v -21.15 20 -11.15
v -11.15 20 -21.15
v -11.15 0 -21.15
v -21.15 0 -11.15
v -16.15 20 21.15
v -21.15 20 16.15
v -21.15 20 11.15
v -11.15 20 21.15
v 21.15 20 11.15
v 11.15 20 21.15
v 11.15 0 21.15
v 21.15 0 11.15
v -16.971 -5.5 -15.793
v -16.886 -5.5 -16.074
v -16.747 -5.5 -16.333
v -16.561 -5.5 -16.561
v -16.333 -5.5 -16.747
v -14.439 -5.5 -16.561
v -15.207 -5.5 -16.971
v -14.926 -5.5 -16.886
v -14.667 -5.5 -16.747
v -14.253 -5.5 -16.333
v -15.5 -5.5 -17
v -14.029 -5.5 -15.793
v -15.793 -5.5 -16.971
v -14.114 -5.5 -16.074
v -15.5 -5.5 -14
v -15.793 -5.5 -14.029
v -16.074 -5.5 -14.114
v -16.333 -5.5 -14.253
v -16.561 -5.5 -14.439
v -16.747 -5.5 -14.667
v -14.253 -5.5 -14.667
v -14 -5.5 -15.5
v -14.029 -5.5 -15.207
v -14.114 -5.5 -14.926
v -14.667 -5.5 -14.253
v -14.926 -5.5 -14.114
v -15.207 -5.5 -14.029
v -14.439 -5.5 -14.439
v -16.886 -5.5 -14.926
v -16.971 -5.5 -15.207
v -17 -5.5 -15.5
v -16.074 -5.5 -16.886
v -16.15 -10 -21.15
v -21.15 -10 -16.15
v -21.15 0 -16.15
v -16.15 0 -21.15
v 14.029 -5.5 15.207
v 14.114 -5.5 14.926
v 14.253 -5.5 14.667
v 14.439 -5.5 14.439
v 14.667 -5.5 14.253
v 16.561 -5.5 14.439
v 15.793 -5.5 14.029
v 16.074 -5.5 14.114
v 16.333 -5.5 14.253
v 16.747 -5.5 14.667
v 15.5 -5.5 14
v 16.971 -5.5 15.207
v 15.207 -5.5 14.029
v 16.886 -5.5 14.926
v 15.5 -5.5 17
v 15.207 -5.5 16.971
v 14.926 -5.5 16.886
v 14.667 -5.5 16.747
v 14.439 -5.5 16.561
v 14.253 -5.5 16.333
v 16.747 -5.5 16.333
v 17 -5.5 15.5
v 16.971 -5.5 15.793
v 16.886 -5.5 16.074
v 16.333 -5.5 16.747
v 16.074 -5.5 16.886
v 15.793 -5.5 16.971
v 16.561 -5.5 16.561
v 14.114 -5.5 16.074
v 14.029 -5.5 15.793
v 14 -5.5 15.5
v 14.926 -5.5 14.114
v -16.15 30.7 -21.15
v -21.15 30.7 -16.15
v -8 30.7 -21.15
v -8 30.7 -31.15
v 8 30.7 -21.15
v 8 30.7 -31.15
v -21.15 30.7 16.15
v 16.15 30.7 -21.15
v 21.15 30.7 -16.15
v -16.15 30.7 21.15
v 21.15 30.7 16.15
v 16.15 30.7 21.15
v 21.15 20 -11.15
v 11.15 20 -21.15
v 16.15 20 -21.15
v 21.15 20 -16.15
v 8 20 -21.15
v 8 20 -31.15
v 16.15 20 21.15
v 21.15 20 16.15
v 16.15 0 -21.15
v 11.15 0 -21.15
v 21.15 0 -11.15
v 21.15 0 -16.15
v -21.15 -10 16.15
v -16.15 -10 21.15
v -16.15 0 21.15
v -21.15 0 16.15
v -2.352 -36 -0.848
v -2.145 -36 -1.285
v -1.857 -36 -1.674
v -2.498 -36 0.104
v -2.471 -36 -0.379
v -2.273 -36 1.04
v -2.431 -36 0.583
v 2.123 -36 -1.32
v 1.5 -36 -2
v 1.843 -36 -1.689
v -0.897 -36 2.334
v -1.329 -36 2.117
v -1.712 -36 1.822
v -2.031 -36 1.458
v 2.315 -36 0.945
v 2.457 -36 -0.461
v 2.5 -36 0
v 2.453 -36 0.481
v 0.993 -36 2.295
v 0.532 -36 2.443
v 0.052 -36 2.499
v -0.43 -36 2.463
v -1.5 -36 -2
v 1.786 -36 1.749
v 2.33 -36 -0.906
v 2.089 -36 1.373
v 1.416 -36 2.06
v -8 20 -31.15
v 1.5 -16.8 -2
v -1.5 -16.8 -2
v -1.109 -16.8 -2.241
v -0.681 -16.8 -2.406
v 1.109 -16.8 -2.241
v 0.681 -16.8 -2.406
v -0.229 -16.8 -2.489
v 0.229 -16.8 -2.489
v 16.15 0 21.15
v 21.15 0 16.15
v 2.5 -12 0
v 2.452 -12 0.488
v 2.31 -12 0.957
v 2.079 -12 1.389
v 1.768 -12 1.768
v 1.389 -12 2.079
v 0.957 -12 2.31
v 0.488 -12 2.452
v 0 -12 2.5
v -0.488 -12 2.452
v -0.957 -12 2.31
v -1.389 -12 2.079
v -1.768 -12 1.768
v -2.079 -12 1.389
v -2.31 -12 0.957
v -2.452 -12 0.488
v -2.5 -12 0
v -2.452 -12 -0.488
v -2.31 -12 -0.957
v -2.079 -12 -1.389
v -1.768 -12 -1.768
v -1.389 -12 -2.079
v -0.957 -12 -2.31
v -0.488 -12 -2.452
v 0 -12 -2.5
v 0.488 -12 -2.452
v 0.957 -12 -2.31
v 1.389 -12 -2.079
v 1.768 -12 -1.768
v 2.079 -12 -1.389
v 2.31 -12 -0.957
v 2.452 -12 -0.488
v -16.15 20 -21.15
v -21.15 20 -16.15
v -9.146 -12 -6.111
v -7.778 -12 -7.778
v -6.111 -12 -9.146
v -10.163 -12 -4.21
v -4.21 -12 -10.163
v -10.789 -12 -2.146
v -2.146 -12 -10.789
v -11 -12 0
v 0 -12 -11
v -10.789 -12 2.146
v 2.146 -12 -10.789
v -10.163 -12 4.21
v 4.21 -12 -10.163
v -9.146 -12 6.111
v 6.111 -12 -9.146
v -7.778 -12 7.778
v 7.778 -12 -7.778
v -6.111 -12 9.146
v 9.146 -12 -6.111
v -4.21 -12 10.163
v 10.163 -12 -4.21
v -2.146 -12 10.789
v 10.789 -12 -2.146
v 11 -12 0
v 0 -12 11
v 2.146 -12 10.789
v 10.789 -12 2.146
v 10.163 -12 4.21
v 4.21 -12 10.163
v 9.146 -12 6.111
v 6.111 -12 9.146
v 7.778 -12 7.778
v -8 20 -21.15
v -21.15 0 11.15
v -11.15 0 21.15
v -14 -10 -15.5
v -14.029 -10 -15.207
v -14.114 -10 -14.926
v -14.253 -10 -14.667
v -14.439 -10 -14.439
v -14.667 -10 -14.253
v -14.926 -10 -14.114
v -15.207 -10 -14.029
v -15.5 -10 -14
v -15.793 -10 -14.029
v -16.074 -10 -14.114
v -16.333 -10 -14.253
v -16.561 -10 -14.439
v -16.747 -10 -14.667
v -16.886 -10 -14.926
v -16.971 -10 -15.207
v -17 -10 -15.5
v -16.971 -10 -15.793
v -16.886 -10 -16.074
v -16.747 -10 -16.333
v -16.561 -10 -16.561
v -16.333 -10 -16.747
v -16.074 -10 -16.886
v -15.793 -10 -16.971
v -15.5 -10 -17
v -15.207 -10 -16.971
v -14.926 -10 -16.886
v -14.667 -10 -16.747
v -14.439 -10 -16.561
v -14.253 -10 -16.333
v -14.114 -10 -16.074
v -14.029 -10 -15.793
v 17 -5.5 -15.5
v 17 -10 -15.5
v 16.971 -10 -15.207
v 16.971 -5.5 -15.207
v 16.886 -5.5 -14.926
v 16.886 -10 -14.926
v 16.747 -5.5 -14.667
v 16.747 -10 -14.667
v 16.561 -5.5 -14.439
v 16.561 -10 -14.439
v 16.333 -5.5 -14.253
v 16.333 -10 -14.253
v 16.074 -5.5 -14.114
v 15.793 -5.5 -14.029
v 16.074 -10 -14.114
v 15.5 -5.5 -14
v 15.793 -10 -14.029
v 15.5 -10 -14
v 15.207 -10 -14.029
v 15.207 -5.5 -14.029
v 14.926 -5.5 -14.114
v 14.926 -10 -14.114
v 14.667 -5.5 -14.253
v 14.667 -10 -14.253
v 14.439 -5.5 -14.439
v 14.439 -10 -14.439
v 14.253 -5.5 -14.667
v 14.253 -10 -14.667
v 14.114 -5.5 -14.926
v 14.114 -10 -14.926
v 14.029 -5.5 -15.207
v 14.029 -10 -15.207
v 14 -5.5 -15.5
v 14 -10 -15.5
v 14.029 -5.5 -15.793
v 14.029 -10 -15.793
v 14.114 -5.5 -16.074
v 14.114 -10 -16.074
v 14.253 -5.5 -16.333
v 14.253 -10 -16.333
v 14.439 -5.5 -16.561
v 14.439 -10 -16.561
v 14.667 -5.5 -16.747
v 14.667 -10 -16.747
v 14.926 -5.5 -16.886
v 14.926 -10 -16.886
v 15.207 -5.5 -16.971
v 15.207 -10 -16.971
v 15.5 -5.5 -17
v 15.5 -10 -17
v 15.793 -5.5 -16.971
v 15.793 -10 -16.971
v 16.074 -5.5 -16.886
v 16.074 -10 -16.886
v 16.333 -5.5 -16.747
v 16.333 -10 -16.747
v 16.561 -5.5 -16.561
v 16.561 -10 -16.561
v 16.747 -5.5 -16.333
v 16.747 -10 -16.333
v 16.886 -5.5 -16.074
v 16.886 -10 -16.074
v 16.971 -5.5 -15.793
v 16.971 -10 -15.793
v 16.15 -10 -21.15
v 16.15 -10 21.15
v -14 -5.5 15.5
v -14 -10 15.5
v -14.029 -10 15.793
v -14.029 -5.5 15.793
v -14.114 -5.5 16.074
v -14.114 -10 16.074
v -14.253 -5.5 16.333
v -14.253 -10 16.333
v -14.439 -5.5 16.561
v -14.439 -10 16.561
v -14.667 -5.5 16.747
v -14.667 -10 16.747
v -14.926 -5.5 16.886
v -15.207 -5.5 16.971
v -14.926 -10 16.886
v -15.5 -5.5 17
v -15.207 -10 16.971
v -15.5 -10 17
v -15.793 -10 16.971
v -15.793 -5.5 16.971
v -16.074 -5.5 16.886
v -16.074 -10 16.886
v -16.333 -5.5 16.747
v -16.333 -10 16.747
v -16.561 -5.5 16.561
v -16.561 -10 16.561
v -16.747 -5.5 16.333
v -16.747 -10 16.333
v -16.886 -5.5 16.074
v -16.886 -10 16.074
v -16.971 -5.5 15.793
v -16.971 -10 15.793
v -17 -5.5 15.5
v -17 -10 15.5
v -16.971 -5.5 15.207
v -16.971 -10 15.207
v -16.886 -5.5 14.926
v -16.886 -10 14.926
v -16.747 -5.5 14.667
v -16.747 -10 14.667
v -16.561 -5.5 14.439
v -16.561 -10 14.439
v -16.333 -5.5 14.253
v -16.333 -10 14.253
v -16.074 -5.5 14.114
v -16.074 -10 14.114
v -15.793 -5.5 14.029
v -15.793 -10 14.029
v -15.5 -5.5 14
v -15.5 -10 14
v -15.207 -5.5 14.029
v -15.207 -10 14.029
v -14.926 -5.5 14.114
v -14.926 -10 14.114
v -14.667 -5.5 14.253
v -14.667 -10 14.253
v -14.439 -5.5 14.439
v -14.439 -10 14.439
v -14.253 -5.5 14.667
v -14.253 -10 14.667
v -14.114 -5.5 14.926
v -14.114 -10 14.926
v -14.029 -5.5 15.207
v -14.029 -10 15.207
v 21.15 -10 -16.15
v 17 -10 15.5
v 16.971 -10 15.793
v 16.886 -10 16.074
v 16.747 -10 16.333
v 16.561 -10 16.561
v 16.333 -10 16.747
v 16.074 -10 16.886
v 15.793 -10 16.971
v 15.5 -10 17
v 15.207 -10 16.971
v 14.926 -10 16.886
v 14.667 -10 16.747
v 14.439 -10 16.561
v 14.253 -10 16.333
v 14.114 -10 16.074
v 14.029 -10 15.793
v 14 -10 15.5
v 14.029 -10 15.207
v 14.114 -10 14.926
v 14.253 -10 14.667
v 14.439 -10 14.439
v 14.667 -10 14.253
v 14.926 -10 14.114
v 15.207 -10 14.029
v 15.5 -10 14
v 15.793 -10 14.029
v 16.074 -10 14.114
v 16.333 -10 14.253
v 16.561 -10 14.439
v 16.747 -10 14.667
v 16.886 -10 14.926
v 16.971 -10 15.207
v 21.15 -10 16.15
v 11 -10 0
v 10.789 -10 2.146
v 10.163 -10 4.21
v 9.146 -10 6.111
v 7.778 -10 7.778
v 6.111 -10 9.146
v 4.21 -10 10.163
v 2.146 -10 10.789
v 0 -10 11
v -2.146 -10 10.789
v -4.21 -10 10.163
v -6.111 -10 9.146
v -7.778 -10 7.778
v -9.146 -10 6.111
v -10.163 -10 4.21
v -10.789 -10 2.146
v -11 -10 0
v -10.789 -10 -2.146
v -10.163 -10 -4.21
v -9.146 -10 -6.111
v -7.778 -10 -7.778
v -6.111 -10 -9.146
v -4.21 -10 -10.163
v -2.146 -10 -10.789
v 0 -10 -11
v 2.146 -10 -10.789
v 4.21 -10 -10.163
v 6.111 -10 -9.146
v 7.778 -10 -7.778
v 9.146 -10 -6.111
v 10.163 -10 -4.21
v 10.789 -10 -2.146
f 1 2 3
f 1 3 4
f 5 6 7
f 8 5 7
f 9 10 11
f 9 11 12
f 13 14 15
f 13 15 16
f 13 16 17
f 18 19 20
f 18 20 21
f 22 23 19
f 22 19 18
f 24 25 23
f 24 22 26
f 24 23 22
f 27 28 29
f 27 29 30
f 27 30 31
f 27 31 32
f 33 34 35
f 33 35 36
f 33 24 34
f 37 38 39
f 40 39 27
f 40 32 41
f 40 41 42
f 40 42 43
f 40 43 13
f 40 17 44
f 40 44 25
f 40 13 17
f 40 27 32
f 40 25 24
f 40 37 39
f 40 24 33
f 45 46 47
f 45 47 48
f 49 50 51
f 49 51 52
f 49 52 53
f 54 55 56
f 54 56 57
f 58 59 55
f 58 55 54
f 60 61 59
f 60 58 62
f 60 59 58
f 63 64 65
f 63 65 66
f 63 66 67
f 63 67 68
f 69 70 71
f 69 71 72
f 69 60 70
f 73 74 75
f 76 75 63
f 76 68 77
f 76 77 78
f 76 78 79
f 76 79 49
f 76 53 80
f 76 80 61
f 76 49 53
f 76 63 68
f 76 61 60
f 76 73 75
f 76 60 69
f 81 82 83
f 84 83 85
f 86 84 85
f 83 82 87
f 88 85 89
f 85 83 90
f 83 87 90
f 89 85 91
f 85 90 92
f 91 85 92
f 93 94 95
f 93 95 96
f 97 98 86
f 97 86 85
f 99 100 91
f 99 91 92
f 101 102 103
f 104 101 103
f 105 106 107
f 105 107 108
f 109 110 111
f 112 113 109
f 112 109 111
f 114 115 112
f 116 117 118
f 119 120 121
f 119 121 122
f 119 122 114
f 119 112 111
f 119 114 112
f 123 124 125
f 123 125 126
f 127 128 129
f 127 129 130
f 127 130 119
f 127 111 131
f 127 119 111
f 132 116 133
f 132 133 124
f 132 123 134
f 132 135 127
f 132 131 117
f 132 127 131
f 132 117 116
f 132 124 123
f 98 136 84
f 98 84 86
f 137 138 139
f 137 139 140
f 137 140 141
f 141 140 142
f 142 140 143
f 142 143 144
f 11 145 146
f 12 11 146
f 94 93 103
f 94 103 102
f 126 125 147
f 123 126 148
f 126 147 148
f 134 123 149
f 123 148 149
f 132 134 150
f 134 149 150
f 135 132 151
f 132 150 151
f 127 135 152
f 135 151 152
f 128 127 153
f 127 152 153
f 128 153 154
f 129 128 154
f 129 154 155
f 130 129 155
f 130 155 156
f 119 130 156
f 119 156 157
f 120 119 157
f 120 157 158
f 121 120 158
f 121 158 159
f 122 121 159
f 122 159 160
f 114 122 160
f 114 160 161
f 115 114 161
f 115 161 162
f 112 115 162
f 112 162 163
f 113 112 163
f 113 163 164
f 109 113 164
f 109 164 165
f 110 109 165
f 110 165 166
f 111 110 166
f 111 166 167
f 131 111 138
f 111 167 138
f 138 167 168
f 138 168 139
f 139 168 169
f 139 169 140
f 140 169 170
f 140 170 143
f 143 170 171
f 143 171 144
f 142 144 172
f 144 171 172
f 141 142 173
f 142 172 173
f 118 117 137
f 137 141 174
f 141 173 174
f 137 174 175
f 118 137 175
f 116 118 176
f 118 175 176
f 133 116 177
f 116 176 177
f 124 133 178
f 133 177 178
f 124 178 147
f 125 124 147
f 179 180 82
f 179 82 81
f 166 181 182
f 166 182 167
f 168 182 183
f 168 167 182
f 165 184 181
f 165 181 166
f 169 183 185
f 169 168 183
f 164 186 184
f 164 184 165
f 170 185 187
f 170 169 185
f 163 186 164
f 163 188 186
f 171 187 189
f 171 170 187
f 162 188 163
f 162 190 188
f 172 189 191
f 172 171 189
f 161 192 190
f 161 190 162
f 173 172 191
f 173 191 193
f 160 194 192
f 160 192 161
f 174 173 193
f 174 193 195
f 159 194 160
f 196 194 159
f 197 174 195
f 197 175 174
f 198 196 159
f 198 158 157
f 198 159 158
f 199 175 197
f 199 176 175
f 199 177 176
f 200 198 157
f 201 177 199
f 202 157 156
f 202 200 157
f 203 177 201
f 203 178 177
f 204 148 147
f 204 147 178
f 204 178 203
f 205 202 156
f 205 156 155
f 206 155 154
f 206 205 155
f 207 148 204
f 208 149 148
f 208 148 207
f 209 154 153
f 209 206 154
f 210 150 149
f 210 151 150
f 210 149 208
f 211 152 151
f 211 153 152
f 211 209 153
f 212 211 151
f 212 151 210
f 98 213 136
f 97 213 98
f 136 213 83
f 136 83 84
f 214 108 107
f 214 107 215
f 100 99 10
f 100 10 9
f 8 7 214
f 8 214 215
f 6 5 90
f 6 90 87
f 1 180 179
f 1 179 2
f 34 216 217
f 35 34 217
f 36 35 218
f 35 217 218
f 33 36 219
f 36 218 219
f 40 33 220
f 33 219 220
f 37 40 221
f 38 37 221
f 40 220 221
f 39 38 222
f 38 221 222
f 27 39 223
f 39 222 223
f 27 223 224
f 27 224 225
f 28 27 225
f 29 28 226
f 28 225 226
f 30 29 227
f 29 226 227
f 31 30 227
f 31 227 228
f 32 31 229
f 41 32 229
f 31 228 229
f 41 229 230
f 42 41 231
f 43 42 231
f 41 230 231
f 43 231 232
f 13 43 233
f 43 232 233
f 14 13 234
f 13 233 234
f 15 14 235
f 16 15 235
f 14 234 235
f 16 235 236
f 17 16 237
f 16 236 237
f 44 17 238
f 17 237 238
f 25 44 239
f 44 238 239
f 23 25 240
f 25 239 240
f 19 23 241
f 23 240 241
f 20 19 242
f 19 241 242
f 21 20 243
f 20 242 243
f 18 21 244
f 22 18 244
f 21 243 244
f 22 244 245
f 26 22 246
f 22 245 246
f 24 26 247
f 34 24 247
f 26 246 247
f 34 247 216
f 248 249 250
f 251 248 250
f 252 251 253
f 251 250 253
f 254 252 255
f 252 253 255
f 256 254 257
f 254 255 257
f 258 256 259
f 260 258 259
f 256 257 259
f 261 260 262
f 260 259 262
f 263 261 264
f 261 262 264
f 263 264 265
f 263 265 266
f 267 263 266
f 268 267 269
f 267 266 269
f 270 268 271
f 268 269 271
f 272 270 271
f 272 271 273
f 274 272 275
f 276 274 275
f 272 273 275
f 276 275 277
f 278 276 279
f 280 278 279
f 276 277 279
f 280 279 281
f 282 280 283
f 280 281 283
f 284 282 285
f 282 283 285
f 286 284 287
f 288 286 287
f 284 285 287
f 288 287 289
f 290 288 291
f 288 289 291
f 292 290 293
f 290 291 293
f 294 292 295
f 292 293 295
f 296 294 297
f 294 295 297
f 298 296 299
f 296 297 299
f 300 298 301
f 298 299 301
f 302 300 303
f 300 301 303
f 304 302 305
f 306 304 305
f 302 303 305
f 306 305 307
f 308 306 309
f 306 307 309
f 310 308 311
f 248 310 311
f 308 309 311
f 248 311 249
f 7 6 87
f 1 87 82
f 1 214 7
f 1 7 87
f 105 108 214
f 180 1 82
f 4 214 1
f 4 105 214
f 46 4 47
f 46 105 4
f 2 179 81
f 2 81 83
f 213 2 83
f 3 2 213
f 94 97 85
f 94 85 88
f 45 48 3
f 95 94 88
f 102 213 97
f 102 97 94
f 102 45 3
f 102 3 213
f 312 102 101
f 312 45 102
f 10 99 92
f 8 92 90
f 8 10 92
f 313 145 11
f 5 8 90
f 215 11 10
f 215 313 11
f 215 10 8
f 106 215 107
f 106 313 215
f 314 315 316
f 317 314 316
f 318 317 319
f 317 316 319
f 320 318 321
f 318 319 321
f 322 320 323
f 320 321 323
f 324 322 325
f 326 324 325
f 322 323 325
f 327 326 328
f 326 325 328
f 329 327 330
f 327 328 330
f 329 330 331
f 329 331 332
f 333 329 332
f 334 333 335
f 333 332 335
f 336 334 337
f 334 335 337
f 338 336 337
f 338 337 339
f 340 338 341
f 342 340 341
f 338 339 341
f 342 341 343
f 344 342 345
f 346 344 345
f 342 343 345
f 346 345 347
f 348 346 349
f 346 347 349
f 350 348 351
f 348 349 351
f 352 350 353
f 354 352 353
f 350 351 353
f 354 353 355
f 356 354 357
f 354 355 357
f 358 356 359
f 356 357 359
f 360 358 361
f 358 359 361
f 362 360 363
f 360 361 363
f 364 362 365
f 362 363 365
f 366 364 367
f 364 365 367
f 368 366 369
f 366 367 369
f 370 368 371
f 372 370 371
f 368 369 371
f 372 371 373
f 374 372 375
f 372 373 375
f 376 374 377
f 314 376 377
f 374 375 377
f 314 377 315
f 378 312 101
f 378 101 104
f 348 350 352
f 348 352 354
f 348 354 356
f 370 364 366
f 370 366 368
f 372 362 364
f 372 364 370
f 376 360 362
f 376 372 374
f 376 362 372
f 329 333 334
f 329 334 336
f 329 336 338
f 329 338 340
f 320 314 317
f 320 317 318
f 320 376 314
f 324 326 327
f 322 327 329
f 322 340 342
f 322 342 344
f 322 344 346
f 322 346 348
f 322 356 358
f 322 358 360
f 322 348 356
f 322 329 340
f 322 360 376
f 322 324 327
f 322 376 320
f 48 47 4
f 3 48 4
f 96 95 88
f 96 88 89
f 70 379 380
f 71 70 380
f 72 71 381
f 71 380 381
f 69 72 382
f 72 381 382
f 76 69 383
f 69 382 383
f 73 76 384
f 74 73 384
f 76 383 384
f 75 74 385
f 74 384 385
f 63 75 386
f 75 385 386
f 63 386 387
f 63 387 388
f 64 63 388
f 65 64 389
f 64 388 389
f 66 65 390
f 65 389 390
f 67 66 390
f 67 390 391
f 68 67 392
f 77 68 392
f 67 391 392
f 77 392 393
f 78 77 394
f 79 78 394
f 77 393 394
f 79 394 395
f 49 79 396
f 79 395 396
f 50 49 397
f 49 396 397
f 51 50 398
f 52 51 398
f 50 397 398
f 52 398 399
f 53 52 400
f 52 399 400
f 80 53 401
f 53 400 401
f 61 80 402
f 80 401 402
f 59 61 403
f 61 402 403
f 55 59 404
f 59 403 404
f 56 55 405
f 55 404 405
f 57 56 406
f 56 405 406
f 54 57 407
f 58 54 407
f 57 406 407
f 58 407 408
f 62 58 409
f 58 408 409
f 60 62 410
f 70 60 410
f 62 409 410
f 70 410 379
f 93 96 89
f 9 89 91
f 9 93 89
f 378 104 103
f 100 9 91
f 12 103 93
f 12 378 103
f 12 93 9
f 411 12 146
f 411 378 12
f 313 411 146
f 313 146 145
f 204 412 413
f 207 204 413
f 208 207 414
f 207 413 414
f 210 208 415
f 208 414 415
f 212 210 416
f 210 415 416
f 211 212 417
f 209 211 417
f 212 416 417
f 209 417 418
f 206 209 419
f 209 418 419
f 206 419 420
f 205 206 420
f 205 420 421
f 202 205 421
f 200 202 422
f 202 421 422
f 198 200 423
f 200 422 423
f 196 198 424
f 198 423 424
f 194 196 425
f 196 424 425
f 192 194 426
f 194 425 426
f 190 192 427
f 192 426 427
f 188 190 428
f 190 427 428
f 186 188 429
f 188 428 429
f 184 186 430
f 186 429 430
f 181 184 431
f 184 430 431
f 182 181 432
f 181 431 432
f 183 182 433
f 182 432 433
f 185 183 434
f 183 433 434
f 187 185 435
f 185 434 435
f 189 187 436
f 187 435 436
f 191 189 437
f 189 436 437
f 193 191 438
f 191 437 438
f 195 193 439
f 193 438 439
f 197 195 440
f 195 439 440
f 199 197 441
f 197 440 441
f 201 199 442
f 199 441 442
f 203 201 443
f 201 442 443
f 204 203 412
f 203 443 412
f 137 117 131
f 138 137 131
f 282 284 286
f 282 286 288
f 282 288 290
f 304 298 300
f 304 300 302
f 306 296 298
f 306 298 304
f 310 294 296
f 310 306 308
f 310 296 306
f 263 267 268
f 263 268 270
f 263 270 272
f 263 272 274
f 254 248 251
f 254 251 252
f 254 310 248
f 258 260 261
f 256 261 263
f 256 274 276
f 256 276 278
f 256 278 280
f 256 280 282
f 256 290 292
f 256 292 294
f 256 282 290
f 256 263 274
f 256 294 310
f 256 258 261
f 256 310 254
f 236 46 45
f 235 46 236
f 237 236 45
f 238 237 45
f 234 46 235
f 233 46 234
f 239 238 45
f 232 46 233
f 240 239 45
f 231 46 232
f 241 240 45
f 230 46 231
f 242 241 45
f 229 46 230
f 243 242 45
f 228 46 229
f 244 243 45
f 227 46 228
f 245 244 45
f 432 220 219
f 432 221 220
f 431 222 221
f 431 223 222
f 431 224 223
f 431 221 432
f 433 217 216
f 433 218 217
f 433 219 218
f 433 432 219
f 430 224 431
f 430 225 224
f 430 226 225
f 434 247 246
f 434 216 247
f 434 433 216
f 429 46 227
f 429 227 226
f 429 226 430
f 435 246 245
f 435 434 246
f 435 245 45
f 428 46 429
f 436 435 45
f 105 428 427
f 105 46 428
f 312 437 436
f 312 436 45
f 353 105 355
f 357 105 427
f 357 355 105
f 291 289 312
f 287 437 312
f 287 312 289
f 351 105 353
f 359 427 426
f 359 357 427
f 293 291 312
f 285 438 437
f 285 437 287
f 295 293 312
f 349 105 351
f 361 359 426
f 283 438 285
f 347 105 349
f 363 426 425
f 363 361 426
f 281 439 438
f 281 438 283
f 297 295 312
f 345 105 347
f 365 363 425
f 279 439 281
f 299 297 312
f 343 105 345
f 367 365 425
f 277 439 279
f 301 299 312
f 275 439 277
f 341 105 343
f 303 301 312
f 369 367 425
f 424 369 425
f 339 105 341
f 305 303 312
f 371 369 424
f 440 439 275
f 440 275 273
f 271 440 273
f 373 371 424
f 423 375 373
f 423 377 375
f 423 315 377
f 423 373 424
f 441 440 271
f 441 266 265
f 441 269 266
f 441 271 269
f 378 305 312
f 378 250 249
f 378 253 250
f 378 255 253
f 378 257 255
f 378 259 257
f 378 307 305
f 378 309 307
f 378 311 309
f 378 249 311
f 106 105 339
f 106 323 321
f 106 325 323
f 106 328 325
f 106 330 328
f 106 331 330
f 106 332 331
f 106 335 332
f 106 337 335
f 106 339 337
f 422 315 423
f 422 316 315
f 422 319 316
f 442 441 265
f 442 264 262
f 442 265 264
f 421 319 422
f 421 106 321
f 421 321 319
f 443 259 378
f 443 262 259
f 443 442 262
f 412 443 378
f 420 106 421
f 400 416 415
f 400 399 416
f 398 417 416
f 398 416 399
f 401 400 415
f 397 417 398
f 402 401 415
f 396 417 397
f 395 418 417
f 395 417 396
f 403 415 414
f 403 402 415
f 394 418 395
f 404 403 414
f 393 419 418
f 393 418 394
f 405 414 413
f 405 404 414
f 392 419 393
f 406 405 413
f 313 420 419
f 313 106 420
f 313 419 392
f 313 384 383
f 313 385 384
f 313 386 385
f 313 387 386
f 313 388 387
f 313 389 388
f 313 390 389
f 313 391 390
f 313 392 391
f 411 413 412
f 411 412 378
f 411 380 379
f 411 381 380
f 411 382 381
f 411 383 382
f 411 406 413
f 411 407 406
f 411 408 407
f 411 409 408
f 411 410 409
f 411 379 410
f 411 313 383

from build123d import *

# Parameters (mm, degrees)
F1_DEPTH = 10
F2_DEPTH = 30.7
F3_DEPTH = 20
F4_R     = 11
F4_R_2   = 2.5
F5_DEPTH = 2
F6_DEPTH = 26
F8_DEPTH = 19.2
F4_R_3   = 1.5
F9_DEPTH = 4.5


with BuildPart() as f1:
    # F0 (on Front) → F1 (new body)
    with BuildSketch(Plane.XZ):
        Polygon((-21.15, 11.15), (-11.15, 21.15), (-16.15, 21.15), (-21.15, 16.15), align=None)
        Polygon((-11.15, -21.15), (-21.15, -11.15), (-21.15, -16.15), (-16.15, -21.15), align=None)
        Polygon((21.15, -16.15), (21.15, -11.15), (11.15, -21.15), (16.15, -21.15), align=None)
        Polygon((16.15, 21.15), (11.15, 21.15), (21.15, 11.15), (21.15, 16.15), align=None)
        Polygon((11.15, 21.15), (-11.15, 21.15), (-21.15, 11.15), (-21.15, -11.15), (-11.15, -21.15), (-8, -21.15), (8, -21.15), (11.15, -21.15), (21.15, -11.15), (21.15, 11.15), align=None)
    extrude(amount=F1_DEPTH)

    # F0 (on Front) → F2 (join)
    with BuildSketch(Plane.XZ):
        Polygon((11.15, 21.15), (-11.15, 21.15), (-21.15, 11.15), (-21.15, -11.15), (-11.15, -21.15), (-8, -21.15), (8, -21.15), (11.15, -21.15), (21.15, -11.15), (21.15, 11.15), align=None)
        Polygon((-21.15, 11.15), (-11.15, 21.15), (-16.15, 21.15), (-21.15, 16.15), align=None)
        Polygon((16.15, 21.15), (11.15, 21.15), (21.15, 11.15), (21.15, 16.15), align=None)
        Polygon((-11.15, -21.15), (-21.15, -11.15), (-21.15, -16.15), (-16.15, -21.15), align=None)
        Polygon((21.15, -16.15), (21.15, -11.15), (11.15, -21.15), (16.15, -21.15), align=None)
        Polygon((8, -21.15), (-8, -21.15), (-8, -31.15), (0, -31.15), (8, -31.15), align=None)
    extrude(amount=-F2_DEPTH)

    # F0 (on Front) → F3 (cut)
    with BuildSketch(Plane.XZ):
        Polygon((16.15, 21.15), (11.15, 21.15), (21.15, 11.15), (21.15, 16.15), align=None)
        Polygon((-21.15, 11.15), (-11.15, 21.15), (-16.15, 21.15), (-21.15, 16.15), align=None)
        Polygon((-11.15, -21.15), (-21.15, -11.15), (-21.15, -16.15), (-16.15, -21.15), align=None)
        Polygon((21.15, -16.15), (21.15, -11.15), (11.15, -21.15), (16.15, -21.15), align=None)
        Polygon((8, -21.15), (-8, -21.15), (-8, -31.15), (0, -31.15), (8, -31.15), align=None)
    extrude(amount=-F3_DEPTH, mode=Mode.SUBTRACT)

    # F4 (on face) → F5 (join)
    with BuildSketch(Plane.XZ.offset(10)):
        Circle(F4_R)
        Circle(F4_R_2, mode=Mode.SUBTRACT)
    extrude(amount=F5_DEPTH)

    # F4 (on face) → F6 (join)
    with BuildSketch(Plane.XZ.offset(10)):
        Circle(F4_R_2)
    extrude(amount=F6_DEPTH)

    # F7 (on face) → F8 (cut)
    with BuildSketch(Plane.XZ.offset(36)):
        with BuildLine():
            Line((1.5, -2), (-1.5, -2))
            ThreePointArc((-1.5, -2), (0, -2.5), (1.5, -2))
        make_face()
    extrude(amount=-F8_DEPTH, mode=Mode.SUBTRACT)

    # F4 (on face) → F9 (cut)
    with BuildSketch(Plane.XZ.offset(10)):
        with Locations((-15.5, 15.5)):
            Circle(F4_R_3)
        with Locations((15.5, 15.5)):
            Circle(F4_R_3)
        with Locations((15.5, -15.5)):
            Circle(F4_R_3)
        with Locations((-15.5, -15.5)):
            Circle(F4_R_3)
    extrude(amount=-F9_DEPTH, mode=Mode.SUBTRACT)


solid = f1.part
